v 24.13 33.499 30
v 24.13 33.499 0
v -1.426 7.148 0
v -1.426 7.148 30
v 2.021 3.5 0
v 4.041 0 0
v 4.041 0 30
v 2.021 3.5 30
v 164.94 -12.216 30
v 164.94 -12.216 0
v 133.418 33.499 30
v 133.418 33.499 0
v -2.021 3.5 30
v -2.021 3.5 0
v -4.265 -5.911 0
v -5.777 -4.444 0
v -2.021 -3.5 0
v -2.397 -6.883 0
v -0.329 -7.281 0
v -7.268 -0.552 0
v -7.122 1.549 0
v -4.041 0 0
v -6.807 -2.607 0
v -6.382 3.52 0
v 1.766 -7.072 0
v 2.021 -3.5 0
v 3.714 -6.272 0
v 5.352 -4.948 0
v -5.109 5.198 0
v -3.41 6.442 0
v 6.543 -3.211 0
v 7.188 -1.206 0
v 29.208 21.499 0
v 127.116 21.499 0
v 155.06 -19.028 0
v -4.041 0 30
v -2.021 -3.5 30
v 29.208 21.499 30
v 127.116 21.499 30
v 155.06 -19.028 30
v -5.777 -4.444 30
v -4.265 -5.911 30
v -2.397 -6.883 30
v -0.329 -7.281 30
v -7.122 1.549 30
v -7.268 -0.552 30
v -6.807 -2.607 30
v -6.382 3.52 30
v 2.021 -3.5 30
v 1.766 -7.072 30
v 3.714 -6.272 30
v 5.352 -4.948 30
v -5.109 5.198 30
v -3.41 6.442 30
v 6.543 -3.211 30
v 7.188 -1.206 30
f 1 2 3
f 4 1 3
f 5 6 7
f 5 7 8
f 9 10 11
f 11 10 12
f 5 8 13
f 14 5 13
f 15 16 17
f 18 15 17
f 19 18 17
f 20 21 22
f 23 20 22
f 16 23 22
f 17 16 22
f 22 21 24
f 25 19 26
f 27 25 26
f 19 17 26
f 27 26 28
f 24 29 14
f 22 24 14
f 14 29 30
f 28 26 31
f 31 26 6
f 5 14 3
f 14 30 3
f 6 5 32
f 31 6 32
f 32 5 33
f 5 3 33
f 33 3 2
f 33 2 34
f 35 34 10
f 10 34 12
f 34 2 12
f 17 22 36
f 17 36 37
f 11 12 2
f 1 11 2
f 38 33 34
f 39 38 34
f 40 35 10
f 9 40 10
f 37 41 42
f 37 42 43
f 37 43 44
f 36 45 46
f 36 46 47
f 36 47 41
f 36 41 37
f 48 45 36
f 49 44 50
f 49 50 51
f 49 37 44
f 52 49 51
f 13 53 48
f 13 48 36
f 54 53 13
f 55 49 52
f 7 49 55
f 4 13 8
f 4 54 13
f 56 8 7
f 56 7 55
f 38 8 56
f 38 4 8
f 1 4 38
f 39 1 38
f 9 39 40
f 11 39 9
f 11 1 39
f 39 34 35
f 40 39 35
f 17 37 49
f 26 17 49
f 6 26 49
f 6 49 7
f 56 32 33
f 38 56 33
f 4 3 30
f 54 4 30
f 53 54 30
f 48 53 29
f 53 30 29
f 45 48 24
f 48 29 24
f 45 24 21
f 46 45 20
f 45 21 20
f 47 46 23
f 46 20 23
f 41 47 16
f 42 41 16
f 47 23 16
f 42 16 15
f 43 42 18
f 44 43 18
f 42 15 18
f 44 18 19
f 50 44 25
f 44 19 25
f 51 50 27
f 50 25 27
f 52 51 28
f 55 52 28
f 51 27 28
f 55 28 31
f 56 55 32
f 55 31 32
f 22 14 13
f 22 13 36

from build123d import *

# Parameters (mm, degrees)
BOSS_EXTRUDE1_DEPTH = 30


with BuildPart() as part:
    # Sketch1 → Boss-Extrude1 (new body)
    with BuildSketch(Plane.XY):
        with BuildLine():
            Line((7.18837747, -1.206261891), (29.208382884, 21.498869199))
            Line((29.208382884, 21.498869199), (127.116350116, 21.498869199))
            Line((127.116350116, 21.498869199), (155.060416965, -19.027825416))
            Line((155.060416965, -19.027825416), (164.939583035, -12.215918359))
            Line((164.939583035, -12.215918359), (133.418209491, 33.498869199))
            Line((133.418209491, 33.498869199), (24.129802766, 33.498869199))
            Line((24.129802766, 33.498869199), (-1.425875737, 7.148056854))
            ThreePointArc((-1.425875737, 7.148056854), (-5.074472088, -5.232358113), (7.18837747, -1.206261891))
        make_face()
        Polygon((4.041451884, 0), (2.020725942, 3.5), (-2.020725942, 3.5), (-4.041451884, 0), (-2.020725942, -3.5), (2.020725942, -3.5), align=None, mode=Mode.SUBTRACT)
    extrude(amount=BOSS_EXTRUDE1_DEPTH)


solid = part.part
